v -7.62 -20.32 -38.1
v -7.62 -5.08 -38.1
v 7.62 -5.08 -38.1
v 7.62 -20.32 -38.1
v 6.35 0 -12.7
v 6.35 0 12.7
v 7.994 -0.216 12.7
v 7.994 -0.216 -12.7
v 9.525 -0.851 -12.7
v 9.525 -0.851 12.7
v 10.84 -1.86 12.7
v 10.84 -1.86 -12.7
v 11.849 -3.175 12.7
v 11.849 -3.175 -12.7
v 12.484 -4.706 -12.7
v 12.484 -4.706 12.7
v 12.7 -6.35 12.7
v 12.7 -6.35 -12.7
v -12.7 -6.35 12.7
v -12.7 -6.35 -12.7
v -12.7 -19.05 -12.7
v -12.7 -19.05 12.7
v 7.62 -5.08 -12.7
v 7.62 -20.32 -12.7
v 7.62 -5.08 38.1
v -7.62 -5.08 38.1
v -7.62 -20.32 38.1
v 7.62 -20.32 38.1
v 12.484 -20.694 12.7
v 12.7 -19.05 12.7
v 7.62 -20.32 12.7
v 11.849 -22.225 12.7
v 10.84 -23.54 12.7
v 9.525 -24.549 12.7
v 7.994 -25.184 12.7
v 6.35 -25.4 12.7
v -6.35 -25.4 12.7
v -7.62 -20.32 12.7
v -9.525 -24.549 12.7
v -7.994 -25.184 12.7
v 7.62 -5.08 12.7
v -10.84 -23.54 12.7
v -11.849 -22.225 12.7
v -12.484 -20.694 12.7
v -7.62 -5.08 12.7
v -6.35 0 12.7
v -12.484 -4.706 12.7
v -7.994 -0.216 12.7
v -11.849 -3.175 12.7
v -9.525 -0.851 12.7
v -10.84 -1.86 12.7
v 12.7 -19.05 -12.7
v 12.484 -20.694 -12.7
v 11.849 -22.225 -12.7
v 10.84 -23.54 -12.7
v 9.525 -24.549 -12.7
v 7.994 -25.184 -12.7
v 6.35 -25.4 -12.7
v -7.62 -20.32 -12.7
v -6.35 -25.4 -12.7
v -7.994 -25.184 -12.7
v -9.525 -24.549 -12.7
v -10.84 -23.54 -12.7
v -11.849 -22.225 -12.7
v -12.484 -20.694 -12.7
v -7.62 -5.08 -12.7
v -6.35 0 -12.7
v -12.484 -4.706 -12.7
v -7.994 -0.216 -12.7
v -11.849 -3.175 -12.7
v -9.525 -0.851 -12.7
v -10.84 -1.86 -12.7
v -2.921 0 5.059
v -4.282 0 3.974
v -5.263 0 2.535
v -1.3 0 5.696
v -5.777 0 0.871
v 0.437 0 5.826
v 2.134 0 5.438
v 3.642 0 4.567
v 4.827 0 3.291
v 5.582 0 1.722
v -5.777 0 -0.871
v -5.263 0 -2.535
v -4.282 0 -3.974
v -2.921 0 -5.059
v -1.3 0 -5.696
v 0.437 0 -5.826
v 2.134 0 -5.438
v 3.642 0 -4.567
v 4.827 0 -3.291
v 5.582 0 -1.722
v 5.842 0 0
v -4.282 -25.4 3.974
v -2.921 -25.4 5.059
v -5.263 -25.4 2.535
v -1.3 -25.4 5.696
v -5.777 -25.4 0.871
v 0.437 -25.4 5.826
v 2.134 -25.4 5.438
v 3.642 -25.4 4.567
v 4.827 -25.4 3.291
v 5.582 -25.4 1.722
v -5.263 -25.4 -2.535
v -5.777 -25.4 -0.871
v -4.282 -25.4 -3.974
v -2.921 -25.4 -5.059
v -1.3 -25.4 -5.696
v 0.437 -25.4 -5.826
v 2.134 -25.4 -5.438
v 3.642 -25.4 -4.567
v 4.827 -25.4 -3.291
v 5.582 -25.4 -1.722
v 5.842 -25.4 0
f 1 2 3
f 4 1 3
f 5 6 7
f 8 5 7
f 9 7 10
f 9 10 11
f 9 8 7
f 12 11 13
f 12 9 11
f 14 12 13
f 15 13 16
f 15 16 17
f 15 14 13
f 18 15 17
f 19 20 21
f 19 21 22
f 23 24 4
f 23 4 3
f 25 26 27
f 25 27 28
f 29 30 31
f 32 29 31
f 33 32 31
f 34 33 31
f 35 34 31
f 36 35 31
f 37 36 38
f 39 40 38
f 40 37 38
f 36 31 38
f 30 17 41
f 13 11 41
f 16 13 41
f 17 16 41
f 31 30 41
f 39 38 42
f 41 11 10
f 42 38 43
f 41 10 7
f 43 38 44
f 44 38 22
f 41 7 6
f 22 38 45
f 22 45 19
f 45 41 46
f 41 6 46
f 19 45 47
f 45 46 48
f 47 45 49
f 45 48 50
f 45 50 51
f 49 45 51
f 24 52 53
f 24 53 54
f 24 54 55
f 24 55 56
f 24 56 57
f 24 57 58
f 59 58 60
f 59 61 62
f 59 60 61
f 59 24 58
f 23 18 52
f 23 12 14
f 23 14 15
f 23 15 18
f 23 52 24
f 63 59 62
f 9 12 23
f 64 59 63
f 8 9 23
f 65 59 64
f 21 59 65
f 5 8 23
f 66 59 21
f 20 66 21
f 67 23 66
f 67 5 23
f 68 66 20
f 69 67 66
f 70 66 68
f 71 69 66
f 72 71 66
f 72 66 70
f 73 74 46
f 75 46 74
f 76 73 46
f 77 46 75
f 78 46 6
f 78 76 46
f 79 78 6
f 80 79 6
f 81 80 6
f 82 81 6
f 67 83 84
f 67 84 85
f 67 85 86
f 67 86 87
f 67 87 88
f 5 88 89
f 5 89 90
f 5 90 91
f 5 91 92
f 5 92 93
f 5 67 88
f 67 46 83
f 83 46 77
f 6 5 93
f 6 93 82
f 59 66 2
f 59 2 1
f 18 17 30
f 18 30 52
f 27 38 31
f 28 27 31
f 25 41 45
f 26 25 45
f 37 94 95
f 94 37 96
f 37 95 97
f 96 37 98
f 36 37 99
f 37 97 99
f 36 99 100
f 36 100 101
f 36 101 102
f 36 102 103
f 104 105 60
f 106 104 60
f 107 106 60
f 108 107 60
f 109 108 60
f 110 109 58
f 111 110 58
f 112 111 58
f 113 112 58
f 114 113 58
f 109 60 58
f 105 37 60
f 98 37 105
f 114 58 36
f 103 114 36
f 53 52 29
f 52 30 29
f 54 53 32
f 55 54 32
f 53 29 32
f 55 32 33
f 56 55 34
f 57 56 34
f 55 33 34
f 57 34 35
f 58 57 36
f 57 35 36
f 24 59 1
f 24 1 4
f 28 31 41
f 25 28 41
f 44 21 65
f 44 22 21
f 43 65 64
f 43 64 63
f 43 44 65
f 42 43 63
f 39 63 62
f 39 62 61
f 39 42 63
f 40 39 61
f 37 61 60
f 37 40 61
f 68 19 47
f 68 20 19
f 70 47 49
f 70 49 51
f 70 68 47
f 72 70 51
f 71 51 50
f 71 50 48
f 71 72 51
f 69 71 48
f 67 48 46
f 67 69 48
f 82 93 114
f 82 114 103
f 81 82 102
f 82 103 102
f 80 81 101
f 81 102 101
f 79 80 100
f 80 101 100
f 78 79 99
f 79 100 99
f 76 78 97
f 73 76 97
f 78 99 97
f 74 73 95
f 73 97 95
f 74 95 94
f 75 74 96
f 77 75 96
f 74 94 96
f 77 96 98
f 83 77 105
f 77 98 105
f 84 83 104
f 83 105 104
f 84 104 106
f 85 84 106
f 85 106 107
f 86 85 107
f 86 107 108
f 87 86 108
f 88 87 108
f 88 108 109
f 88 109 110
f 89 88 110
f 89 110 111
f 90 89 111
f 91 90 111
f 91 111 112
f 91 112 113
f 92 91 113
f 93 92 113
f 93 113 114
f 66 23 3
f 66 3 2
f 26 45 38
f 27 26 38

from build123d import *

# Parameters (mm, degrees)
F1_DEPTH = 25.4
F3_DEPTH = 25.4
F5_R     = 6.35
F7_D     = 11.684
F7_DEPTH = 254


with BuildPart() as f1:
    # F0 (on Front) → F1 (new body)
    with BuildSketch(Plane.XZ):
        Polygon((-12.7, 0), (0, 0), (12.7, 0), (12.7, 12.7), (0, 12.7), (-12.7, 12.7), align=None)
    extrude(amount=F1_DEPTH)

    # F2 (on face) → F3 (join)
    with BuildSketch(Plane.XY.offset(12.7)):
        Polygon((7.62, -5.08), (0, -5.08), (0, -12.7), (0, -20.32), (7.62, -20.32), align=None)
        Polygon((0, -12.7), (0, -5.08), (-7.62, -5.08), (-7.62, -20.32), (0, -20.32), align=None)
    extrude(amount=F3_DEPTH)

    # F4: F1 across plane


with BuildPart() as f1_1:
    add(f1.part)
    add(f1.part.mirror(Plane.XY))

    # F5
    f5_edges = [f1_1.edges().sort_by_distance(p)[0] for p in [
        (12.7, 0, 0),
        (12.7, -25.4, 0),
        (-12.7, 0, 0),
        (-12.7, -25.4, 0),
    ]]
    fillet(f5_edges, radius=F5_R)

    # F7
    with Locations(Plane(origin=(0, 0, 0), x_dir=(-1, 0, 0), z_dir=(0, 1, 0))):
        with Locations((0, 0)):
            Hole(F7_D / 2, depth=F7_DEPTH)


solid = f1_1.part
